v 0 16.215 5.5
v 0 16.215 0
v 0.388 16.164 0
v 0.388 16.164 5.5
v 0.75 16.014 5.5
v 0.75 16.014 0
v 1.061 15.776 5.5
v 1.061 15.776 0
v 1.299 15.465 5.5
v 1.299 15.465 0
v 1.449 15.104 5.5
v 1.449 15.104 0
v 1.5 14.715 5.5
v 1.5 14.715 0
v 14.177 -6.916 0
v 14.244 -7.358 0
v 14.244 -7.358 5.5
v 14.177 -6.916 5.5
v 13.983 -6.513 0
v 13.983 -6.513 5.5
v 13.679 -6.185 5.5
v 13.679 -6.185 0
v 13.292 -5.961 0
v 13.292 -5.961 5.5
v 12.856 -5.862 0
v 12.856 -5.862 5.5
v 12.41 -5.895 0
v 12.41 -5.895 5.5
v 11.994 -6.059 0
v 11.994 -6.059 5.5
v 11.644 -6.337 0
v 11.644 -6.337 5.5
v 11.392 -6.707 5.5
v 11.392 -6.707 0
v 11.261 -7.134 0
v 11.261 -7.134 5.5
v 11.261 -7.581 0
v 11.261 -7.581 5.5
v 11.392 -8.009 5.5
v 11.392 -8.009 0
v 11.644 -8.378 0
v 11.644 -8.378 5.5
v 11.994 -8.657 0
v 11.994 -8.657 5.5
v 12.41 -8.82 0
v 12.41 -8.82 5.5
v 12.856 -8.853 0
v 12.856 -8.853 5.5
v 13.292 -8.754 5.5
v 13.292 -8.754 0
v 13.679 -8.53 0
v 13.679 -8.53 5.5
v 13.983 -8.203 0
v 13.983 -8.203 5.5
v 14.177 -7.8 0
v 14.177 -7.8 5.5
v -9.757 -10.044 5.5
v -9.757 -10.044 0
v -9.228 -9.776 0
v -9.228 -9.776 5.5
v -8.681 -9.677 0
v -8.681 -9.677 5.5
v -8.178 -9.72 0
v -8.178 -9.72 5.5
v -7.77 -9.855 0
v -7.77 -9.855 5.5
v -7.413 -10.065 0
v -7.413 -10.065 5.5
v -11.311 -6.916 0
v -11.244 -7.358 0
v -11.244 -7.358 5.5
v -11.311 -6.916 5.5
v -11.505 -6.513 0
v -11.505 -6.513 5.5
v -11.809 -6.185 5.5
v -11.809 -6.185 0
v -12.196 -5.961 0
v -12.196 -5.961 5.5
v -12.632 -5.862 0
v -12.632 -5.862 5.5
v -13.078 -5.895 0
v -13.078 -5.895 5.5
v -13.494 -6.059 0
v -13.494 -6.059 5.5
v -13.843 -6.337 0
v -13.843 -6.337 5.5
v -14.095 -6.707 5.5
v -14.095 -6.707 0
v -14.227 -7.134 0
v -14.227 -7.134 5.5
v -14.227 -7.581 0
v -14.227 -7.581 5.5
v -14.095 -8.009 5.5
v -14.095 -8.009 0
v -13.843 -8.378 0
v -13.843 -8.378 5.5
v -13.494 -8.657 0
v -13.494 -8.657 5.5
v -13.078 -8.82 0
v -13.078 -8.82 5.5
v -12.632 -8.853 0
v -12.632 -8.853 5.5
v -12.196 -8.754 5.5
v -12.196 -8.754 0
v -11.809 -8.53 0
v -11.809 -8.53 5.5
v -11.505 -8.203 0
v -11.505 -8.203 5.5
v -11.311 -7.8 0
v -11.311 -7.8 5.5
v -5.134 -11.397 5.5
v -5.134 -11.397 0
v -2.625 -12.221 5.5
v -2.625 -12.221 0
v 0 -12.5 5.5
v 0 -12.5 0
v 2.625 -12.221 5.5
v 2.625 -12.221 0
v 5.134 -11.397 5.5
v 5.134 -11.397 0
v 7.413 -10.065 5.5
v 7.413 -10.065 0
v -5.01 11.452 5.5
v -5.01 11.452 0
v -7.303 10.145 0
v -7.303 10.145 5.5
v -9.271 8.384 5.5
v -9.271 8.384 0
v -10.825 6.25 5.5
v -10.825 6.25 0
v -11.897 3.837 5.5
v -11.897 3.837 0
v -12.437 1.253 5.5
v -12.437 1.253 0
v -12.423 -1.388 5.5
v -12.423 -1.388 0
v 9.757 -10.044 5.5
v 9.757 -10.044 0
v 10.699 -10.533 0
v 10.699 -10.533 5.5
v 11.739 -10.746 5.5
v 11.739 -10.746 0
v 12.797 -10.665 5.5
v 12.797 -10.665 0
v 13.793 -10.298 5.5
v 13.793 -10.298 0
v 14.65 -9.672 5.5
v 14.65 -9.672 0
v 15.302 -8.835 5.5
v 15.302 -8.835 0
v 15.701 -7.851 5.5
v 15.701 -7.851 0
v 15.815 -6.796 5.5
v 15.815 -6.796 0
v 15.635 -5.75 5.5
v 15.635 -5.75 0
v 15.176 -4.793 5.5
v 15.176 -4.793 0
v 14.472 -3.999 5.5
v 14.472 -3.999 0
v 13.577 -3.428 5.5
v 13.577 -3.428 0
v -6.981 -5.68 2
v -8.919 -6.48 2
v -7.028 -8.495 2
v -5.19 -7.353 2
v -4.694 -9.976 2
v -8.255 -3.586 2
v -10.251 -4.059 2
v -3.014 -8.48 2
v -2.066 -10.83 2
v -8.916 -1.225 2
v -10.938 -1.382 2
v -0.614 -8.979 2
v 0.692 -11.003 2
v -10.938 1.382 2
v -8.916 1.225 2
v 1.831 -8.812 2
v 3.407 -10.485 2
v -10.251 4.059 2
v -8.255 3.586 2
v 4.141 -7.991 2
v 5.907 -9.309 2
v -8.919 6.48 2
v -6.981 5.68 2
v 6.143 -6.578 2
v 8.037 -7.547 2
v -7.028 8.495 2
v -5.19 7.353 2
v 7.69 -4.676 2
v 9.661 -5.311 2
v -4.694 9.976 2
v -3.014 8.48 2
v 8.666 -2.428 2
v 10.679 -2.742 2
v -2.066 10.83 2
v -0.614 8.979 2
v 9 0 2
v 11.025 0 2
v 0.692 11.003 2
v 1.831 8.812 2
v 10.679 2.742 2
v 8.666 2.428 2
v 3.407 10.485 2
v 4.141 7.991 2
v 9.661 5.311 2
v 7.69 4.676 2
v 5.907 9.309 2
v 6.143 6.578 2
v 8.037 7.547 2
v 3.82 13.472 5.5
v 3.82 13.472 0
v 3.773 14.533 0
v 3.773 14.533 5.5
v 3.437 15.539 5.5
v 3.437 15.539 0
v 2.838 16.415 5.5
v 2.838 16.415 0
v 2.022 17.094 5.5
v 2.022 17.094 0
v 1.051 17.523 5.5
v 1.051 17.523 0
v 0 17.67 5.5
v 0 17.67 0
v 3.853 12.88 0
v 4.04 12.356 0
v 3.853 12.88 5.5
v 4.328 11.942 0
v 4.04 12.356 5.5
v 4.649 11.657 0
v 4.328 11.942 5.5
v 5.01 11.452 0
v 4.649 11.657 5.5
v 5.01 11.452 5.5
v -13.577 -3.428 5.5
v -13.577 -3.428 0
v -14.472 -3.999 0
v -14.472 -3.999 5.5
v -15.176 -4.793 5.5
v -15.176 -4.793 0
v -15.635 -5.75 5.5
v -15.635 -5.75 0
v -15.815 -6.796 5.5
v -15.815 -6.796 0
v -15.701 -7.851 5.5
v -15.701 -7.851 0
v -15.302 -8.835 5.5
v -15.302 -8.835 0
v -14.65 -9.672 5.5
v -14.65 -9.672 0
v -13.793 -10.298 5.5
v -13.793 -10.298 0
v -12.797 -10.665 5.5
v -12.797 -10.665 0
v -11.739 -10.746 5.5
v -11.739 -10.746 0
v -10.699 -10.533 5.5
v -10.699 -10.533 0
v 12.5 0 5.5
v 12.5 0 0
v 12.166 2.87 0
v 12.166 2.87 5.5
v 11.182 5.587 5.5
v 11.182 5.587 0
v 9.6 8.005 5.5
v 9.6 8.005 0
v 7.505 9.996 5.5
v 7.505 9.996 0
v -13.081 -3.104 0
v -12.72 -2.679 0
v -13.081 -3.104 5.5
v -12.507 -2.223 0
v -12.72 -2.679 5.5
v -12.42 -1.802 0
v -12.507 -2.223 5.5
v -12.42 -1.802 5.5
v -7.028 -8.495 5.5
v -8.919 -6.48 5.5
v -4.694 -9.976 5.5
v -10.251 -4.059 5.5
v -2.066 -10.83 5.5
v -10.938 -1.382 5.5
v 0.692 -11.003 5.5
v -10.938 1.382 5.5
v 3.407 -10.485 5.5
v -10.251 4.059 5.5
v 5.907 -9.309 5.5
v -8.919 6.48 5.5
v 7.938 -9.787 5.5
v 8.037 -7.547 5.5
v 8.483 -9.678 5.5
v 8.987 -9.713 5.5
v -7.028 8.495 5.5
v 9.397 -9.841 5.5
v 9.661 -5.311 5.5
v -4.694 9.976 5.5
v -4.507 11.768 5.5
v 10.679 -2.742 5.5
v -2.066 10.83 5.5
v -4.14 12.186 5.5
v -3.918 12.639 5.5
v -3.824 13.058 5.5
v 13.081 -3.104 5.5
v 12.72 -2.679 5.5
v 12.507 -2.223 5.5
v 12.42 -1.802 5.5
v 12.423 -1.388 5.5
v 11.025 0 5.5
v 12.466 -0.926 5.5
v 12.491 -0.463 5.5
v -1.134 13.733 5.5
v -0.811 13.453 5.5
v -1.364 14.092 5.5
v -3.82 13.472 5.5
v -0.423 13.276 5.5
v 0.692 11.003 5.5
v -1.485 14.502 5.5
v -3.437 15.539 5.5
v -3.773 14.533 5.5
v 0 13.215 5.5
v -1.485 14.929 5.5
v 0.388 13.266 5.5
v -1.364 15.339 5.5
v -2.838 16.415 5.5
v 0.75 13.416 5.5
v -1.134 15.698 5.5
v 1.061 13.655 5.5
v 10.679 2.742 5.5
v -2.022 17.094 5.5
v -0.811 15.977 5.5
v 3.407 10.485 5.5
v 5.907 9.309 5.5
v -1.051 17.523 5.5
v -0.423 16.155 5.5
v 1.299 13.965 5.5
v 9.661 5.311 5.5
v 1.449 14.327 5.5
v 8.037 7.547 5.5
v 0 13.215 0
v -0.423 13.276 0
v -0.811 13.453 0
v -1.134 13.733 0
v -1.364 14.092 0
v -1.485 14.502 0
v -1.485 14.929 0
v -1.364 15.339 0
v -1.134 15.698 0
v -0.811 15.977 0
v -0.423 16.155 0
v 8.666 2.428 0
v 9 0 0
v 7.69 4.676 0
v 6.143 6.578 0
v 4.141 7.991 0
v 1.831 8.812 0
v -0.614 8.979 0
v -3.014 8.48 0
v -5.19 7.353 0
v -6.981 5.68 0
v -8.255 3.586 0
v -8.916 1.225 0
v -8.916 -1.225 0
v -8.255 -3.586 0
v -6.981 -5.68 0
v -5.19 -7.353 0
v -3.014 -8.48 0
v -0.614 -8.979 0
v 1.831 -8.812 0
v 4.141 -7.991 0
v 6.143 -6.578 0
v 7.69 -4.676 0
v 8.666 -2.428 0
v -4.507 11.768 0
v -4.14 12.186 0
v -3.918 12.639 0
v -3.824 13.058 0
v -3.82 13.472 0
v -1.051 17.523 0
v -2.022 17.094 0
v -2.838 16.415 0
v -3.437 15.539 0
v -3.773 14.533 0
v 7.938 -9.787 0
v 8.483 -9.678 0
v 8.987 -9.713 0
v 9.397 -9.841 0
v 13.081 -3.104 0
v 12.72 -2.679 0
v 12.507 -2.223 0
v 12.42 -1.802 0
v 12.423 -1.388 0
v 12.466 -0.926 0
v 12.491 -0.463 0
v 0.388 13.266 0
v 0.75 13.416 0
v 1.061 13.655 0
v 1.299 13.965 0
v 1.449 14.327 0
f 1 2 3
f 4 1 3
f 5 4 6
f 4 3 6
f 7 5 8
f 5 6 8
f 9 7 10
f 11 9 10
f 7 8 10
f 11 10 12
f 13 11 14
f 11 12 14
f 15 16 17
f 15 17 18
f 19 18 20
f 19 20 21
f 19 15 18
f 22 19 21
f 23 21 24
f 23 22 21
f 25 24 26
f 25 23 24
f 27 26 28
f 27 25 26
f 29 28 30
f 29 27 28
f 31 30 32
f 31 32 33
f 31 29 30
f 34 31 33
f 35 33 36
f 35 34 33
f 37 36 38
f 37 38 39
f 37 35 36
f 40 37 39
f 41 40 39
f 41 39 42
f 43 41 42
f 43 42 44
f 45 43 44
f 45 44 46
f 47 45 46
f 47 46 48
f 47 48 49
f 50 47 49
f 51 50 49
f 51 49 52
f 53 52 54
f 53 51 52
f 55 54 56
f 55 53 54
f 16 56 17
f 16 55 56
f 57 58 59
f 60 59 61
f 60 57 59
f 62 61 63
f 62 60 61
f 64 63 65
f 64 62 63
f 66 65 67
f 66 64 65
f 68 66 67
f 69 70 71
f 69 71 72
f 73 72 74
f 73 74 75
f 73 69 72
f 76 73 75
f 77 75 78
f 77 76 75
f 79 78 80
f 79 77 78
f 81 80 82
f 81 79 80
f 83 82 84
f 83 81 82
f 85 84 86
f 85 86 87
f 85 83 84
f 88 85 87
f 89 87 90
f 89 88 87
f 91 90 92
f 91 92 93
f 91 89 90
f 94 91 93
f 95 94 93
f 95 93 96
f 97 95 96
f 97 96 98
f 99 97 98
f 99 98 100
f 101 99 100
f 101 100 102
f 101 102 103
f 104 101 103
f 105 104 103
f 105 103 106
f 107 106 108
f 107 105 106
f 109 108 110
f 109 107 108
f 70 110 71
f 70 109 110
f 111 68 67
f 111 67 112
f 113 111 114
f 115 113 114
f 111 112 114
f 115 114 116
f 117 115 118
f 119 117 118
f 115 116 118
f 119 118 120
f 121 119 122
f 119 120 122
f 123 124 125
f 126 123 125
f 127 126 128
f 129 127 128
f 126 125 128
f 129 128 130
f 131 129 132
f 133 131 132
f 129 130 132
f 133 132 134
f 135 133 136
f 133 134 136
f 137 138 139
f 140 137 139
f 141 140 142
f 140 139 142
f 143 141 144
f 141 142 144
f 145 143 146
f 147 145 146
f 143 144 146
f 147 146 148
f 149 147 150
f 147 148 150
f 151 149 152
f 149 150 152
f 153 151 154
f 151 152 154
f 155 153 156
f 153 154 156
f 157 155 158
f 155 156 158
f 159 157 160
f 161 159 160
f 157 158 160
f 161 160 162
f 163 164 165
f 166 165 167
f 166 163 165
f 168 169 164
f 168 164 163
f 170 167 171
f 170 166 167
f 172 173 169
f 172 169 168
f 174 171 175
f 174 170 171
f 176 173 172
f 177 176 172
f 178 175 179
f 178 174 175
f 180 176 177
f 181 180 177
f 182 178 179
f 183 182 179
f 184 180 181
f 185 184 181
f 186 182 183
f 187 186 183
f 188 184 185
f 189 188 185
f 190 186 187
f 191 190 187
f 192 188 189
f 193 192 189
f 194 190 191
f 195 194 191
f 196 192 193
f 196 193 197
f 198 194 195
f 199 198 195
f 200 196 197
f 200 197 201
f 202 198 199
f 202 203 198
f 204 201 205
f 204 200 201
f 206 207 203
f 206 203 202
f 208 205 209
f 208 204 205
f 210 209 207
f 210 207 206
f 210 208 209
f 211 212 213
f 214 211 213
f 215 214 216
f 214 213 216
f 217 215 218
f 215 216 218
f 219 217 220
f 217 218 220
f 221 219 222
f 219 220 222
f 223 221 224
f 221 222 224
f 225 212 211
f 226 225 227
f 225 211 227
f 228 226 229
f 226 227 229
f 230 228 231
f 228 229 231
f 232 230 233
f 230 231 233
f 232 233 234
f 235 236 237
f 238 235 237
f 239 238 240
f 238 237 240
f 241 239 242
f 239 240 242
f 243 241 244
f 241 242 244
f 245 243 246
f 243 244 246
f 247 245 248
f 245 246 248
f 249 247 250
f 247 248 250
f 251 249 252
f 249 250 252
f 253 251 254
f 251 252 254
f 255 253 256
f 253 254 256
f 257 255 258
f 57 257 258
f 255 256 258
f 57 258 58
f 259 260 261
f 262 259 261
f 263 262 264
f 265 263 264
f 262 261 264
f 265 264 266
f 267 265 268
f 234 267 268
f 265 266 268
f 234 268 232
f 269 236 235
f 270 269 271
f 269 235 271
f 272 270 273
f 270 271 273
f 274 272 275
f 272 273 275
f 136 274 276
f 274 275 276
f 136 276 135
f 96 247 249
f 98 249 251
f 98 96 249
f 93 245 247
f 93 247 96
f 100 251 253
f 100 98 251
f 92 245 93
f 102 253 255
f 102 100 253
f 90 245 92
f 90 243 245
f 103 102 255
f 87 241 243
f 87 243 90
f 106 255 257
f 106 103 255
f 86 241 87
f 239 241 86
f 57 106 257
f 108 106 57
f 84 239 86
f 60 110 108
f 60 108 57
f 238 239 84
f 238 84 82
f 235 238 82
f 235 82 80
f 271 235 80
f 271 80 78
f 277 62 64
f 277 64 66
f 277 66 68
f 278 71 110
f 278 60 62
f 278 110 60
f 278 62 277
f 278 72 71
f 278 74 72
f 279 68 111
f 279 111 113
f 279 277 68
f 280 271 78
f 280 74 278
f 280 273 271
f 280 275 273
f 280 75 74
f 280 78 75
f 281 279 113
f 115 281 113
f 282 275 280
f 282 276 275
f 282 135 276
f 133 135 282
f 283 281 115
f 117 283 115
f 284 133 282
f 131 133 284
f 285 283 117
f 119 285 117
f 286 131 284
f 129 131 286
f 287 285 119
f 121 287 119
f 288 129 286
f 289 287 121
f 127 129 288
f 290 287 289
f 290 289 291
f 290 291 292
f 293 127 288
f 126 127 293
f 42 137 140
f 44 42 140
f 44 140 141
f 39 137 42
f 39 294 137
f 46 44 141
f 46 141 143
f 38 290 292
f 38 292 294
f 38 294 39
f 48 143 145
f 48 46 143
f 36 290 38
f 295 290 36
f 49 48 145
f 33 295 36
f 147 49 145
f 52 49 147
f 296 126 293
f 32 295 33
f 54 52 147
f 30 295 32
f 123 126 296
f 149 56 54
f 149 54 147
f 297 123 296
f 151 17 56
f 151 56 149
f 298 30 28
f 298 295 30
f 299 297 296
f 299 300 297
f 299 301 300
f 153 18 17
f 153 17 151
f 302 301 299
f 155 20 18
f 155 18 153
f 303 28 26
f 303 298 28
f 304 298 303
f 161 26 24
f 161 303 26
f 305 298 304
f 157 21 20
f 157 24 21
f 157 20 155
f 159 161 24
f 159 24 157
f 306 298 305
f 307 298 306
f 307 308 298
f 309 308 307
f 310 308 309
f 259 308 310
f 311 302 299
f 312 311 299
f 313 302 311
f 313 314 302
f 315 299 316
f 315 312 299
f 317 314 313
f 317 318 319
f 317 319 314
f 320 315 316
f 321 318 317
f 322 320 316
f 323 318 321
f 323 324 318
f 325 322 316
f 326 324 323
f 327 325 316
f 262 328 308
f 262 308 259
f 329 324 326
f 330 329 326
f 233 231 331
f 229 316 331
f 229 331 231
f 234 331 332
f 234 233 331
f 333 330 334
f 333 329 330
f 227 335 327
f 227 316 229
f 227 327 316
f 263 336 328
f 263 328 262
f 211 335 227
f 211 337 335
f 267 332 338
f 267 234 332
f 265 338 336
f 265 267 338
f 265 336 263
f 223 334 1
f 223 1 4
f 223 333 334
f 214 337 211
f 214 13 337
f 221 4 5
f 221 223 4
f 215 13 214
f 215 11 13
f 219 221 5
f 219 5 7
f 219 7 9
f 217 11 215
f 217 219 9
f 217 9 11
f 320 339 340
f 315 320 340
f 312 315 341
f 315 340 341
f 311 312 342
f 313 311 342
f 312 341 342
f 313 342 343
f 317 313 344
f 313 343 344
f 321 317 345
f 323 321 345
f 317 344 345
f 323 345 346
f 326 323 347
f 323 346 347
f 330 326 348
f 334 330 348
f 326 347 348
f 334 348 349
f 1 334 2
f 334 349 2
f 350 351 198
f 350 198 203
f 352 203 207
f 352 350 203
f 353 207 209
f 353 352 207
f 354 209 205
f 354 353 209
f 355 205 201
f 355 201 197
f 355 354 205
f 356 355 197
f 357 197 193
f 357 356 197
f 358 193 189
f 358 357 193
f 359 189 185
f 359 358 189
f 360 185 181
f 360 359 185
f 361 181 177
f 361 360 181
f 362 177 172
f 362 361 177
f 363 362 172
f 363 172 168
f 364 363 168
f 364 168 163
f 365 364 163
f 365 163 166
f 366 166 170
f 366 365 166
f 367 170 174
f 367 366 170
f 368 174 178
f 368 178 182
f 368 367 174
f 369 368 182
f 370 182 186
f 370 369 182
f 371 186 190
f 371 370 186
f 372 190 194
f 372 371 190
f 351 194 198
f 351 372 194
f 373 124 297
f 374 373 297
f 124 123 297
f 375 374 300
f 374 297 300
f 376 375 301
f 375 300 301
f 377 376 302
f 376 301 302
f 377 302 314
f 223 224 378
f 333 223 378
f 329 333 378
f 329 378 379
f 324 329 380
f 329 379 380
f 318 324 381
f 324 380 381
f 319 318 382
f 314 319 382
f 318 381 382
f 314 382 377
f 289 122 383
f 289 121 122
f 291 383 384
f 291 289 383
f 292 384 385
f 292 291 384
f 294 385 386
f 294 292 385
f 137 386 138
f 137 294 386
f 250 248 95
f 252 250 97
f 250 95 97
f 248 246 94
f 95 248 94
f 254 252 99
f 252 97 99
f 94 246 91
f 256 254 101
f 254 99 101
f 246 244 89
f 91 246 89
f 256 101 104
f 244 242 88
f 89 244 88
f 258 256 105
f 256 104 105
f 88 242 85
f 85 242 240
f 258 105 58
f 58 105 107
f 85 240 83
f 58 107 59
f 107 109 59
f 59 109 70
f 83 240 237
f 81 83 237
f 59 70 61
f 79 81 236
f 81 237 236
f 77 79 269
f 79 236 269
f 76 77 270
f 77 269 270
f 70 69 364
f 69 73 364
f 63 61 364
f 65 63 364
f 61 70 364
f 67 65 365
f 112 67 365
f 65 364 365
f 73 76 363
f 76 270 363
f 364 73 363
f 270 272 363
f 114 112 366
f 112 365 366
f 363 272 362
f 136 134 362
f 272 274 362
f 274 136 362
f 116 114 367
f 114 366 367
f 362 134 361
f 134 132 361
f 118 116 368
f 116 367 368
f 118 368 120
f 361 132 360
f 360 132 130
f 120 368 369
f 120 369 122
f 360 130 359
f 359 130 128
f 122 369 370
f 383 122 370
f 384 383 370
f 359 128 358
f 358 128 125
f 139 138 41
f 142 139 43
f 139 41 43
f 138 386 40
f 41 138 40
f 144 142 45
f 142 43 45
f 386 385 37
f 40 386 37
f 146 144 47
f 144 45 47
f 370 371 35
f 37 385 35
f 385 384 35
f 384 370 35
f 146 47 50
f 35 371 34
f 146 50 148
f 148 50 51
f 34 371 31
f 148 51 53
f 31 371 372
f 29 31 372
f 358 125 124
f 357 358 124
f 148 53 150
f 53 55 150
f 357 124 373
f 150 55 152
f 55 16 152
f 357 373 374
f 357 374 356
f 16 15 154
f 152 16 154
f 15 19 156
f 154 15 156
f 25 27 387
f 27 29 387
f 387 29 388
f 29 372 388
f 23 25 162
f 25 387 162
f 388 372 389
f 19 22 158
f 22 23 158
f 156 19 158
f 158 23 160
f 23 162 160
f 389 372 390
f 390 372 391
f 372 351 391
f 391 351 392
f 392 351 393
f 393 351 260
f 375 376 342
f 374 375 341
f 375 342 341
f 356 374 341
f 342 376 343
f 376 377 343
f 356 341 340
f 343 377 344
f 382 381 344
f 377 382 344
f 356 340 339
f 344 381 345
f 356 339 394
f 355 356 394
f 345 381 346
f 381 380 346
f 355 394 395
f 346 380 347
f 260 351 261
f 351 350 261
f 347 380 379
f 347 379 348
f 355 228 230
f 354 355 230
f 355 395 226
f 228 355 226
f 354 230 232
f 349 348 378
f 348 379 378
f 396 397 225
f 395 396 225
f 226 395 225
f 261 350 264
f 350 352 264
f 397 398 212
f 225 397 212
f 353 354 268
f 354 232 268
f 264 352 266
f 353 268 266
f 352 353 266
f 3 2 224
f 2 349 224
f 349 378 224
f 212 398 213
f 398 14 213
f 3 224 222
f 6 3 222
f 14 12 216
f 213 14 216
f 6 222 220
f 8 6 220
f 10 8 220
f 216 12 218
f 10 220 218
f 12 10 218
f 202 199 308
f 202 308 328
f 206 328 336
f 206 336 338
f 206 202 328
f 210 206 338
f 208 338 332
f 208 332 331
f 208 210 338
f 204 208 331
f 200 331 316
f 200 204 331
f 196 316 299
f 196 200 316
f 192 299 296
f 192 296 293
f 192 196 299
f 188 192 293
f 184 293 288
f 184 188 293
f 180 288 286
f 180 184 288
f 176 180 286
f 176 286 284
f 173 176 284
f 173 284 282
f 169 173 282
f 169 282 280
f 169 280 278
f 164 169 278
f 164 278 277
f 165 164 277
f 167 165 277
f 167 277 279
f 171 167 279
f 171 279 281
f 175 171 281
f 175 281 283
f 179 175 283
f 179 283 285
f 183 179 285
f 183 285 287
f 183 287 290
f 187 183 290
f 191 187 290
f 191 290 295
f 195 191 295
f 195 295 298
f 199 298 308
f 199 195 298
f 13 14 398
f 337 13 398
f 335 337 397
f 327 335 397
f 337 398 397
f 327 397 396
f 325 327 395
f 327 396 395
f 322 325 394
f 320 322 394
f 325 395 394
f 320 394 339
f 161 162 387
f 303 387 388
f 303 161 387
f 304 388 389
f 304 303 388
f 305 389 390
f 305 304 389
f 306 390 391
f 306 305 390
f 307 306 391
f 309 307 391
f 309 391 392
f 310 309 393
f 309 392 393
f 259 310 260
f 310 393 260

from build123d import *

# Parameters (mm, degrees)
F0_R     = 1.5
F0_R_2   = 11.025
F1_DEPTH = 5.5
F0_R_3   = 9
F2_DEPTH = 2
F3_R     = 2


with BuildPart() as f1:
    # F0 (on Top) → F1 (new body)
    with BuildSketch(Plane.XY):
        with BuildLine():
            ThreePointArc((-12.1141484076, -3.0817865531), (-15.3023705753, -8.8348277709), (-8.7259796478, -8.9502669896))
            ThreePointArc((-8.7259796478, -8.9502669896), (-10.8253175473, -6.25), (-12.1141484076, -3.0817865531))
        make_face()
        with Locations((-12.7438917843, -7.3576893522)):
            Circle(F0_R, mode=Mode.SUBTRACT)
        with BuildLine():
            ThreePointArc((12.1141484076, -3.0817865531), (12.403161998, -1.5529238399), (12.5, 0))
            ThreePointArc((12.5, 0), (9.9649914575, 7.5464524945), (3.3881687598, 12.0320535427))
            ThreePointArc((3.3881687598, 12.0320535427), (1.7101653013, 12.3824607668), (0, 12.5))
            ThreePointArc((0, 12.5), (-1.7101653013, 12.3824607668), (-3.3881687598, 12.0320535427))
            ThreePointArc((-3.3881687598, 12.0320535427), (-10.8253175473, 6.25), (-12.1141484076, -3.0817865531))
            ThreePointArc((-12.1141484076, -3.0817865531), (-10.8253175473, -6.25), (-8.7259796478, -8.9502669896))
            ThreePointArc((-8.7259796478, -8.9502669896), (0, -12.5), (8.7259796478, -8.9502669896))
            ThreePointArc((8.7259796478, -8.9502669896), (10.8253175473, -6.25), (12.1141484076, -3.0817865531))
        make_face()
        Circle(F0_R_2, mode=Mode.SUBTRACT)
        with BuildLine():
            ThreePointArc((-3.3881687598, 12.0320535427), (-1.7101653013, 12.3824607668), (0, 12.5))
            Line((0, 12.5), (0, 13.2153787043))
            ThreePointArc((0, 13.2153787043), (-1.5, 14.7153787043), (0, 16.2153787043))
            Line((0, 16.2153787043), (0, 16.9307574087))
            Line((0, 16.9307574087), (0, 17.6696555418))
            ThreePointArc((0, 17.6696555418), (-3.2887020177, 15.8092112452), (-3.3881687598, 12.0320535427))
        make_face()
        with BuildLine():
            ThreePointArc((0, 12.5), (1.7101653013, 12.3824607668), (3.3881687598, 12.0320535427))
            ThreePointArc((3.3881687598, 12.0320535427), (3.2887020177, 15.8092112452), (0, 17.6696555418))
            Line((0, 17.6696555418), (0, 16.9307574087))
            Line((0, 16.9307574087), (0, 16.2153787043))
            ThreePointArc((0, 16.2153787043), (1.0606601718, 15.7760388761), (1.5, 14.7153787043))
            ThreePointArc((1.5, 14.7153787043), (1.0606601718, 13.6547185326), (0, 13.2153787043))
            Line((0, 13.2153787043), (0, 12.5))
        make_face()
        with BuildLine():
            ThreePointArc((8.7259796478, -8.9502669896), (15.3023705753, -8.8348277709), (12.1141484076, -3.0817865531))
            ThreePointArc((12.1141484076, -3.0817865531), (10.8253175473, -6.25), (8.7259796478, -8.9502669896))
        make_face()
        with Locations((12.7438917843, -7.3576893522)):
            Circle(F0_R, mode=Mode.SUBTRACT)
    extrude(amount=F1_DEPTH)

    # F0 (on Top) → F2 (join)
    with BuildSketch(Plane.XY):
        Circle(F0_R_2)
        Circle(F0_R_3, mode=Mode.SUBTRACT)
    extrude(amount=F2_DEPTH)

    # F3
    f3_edges = [f1.edges().sort_by_distance(p)[0] for p in [
        (3.388169, 12.032054, 2.75),
        (8.72598, -8.950267, 2.75),
        (-12.114148, -3.081787, 2.75),
        (-8.72598, -8.950267, 2.75),
        (-3.388169, 12.032054, 2.75),
        (12.114148, -3.081787, 2.75),
    ]]
    fillet(f3_edges, radius=F3_R)


solid = f1.part
